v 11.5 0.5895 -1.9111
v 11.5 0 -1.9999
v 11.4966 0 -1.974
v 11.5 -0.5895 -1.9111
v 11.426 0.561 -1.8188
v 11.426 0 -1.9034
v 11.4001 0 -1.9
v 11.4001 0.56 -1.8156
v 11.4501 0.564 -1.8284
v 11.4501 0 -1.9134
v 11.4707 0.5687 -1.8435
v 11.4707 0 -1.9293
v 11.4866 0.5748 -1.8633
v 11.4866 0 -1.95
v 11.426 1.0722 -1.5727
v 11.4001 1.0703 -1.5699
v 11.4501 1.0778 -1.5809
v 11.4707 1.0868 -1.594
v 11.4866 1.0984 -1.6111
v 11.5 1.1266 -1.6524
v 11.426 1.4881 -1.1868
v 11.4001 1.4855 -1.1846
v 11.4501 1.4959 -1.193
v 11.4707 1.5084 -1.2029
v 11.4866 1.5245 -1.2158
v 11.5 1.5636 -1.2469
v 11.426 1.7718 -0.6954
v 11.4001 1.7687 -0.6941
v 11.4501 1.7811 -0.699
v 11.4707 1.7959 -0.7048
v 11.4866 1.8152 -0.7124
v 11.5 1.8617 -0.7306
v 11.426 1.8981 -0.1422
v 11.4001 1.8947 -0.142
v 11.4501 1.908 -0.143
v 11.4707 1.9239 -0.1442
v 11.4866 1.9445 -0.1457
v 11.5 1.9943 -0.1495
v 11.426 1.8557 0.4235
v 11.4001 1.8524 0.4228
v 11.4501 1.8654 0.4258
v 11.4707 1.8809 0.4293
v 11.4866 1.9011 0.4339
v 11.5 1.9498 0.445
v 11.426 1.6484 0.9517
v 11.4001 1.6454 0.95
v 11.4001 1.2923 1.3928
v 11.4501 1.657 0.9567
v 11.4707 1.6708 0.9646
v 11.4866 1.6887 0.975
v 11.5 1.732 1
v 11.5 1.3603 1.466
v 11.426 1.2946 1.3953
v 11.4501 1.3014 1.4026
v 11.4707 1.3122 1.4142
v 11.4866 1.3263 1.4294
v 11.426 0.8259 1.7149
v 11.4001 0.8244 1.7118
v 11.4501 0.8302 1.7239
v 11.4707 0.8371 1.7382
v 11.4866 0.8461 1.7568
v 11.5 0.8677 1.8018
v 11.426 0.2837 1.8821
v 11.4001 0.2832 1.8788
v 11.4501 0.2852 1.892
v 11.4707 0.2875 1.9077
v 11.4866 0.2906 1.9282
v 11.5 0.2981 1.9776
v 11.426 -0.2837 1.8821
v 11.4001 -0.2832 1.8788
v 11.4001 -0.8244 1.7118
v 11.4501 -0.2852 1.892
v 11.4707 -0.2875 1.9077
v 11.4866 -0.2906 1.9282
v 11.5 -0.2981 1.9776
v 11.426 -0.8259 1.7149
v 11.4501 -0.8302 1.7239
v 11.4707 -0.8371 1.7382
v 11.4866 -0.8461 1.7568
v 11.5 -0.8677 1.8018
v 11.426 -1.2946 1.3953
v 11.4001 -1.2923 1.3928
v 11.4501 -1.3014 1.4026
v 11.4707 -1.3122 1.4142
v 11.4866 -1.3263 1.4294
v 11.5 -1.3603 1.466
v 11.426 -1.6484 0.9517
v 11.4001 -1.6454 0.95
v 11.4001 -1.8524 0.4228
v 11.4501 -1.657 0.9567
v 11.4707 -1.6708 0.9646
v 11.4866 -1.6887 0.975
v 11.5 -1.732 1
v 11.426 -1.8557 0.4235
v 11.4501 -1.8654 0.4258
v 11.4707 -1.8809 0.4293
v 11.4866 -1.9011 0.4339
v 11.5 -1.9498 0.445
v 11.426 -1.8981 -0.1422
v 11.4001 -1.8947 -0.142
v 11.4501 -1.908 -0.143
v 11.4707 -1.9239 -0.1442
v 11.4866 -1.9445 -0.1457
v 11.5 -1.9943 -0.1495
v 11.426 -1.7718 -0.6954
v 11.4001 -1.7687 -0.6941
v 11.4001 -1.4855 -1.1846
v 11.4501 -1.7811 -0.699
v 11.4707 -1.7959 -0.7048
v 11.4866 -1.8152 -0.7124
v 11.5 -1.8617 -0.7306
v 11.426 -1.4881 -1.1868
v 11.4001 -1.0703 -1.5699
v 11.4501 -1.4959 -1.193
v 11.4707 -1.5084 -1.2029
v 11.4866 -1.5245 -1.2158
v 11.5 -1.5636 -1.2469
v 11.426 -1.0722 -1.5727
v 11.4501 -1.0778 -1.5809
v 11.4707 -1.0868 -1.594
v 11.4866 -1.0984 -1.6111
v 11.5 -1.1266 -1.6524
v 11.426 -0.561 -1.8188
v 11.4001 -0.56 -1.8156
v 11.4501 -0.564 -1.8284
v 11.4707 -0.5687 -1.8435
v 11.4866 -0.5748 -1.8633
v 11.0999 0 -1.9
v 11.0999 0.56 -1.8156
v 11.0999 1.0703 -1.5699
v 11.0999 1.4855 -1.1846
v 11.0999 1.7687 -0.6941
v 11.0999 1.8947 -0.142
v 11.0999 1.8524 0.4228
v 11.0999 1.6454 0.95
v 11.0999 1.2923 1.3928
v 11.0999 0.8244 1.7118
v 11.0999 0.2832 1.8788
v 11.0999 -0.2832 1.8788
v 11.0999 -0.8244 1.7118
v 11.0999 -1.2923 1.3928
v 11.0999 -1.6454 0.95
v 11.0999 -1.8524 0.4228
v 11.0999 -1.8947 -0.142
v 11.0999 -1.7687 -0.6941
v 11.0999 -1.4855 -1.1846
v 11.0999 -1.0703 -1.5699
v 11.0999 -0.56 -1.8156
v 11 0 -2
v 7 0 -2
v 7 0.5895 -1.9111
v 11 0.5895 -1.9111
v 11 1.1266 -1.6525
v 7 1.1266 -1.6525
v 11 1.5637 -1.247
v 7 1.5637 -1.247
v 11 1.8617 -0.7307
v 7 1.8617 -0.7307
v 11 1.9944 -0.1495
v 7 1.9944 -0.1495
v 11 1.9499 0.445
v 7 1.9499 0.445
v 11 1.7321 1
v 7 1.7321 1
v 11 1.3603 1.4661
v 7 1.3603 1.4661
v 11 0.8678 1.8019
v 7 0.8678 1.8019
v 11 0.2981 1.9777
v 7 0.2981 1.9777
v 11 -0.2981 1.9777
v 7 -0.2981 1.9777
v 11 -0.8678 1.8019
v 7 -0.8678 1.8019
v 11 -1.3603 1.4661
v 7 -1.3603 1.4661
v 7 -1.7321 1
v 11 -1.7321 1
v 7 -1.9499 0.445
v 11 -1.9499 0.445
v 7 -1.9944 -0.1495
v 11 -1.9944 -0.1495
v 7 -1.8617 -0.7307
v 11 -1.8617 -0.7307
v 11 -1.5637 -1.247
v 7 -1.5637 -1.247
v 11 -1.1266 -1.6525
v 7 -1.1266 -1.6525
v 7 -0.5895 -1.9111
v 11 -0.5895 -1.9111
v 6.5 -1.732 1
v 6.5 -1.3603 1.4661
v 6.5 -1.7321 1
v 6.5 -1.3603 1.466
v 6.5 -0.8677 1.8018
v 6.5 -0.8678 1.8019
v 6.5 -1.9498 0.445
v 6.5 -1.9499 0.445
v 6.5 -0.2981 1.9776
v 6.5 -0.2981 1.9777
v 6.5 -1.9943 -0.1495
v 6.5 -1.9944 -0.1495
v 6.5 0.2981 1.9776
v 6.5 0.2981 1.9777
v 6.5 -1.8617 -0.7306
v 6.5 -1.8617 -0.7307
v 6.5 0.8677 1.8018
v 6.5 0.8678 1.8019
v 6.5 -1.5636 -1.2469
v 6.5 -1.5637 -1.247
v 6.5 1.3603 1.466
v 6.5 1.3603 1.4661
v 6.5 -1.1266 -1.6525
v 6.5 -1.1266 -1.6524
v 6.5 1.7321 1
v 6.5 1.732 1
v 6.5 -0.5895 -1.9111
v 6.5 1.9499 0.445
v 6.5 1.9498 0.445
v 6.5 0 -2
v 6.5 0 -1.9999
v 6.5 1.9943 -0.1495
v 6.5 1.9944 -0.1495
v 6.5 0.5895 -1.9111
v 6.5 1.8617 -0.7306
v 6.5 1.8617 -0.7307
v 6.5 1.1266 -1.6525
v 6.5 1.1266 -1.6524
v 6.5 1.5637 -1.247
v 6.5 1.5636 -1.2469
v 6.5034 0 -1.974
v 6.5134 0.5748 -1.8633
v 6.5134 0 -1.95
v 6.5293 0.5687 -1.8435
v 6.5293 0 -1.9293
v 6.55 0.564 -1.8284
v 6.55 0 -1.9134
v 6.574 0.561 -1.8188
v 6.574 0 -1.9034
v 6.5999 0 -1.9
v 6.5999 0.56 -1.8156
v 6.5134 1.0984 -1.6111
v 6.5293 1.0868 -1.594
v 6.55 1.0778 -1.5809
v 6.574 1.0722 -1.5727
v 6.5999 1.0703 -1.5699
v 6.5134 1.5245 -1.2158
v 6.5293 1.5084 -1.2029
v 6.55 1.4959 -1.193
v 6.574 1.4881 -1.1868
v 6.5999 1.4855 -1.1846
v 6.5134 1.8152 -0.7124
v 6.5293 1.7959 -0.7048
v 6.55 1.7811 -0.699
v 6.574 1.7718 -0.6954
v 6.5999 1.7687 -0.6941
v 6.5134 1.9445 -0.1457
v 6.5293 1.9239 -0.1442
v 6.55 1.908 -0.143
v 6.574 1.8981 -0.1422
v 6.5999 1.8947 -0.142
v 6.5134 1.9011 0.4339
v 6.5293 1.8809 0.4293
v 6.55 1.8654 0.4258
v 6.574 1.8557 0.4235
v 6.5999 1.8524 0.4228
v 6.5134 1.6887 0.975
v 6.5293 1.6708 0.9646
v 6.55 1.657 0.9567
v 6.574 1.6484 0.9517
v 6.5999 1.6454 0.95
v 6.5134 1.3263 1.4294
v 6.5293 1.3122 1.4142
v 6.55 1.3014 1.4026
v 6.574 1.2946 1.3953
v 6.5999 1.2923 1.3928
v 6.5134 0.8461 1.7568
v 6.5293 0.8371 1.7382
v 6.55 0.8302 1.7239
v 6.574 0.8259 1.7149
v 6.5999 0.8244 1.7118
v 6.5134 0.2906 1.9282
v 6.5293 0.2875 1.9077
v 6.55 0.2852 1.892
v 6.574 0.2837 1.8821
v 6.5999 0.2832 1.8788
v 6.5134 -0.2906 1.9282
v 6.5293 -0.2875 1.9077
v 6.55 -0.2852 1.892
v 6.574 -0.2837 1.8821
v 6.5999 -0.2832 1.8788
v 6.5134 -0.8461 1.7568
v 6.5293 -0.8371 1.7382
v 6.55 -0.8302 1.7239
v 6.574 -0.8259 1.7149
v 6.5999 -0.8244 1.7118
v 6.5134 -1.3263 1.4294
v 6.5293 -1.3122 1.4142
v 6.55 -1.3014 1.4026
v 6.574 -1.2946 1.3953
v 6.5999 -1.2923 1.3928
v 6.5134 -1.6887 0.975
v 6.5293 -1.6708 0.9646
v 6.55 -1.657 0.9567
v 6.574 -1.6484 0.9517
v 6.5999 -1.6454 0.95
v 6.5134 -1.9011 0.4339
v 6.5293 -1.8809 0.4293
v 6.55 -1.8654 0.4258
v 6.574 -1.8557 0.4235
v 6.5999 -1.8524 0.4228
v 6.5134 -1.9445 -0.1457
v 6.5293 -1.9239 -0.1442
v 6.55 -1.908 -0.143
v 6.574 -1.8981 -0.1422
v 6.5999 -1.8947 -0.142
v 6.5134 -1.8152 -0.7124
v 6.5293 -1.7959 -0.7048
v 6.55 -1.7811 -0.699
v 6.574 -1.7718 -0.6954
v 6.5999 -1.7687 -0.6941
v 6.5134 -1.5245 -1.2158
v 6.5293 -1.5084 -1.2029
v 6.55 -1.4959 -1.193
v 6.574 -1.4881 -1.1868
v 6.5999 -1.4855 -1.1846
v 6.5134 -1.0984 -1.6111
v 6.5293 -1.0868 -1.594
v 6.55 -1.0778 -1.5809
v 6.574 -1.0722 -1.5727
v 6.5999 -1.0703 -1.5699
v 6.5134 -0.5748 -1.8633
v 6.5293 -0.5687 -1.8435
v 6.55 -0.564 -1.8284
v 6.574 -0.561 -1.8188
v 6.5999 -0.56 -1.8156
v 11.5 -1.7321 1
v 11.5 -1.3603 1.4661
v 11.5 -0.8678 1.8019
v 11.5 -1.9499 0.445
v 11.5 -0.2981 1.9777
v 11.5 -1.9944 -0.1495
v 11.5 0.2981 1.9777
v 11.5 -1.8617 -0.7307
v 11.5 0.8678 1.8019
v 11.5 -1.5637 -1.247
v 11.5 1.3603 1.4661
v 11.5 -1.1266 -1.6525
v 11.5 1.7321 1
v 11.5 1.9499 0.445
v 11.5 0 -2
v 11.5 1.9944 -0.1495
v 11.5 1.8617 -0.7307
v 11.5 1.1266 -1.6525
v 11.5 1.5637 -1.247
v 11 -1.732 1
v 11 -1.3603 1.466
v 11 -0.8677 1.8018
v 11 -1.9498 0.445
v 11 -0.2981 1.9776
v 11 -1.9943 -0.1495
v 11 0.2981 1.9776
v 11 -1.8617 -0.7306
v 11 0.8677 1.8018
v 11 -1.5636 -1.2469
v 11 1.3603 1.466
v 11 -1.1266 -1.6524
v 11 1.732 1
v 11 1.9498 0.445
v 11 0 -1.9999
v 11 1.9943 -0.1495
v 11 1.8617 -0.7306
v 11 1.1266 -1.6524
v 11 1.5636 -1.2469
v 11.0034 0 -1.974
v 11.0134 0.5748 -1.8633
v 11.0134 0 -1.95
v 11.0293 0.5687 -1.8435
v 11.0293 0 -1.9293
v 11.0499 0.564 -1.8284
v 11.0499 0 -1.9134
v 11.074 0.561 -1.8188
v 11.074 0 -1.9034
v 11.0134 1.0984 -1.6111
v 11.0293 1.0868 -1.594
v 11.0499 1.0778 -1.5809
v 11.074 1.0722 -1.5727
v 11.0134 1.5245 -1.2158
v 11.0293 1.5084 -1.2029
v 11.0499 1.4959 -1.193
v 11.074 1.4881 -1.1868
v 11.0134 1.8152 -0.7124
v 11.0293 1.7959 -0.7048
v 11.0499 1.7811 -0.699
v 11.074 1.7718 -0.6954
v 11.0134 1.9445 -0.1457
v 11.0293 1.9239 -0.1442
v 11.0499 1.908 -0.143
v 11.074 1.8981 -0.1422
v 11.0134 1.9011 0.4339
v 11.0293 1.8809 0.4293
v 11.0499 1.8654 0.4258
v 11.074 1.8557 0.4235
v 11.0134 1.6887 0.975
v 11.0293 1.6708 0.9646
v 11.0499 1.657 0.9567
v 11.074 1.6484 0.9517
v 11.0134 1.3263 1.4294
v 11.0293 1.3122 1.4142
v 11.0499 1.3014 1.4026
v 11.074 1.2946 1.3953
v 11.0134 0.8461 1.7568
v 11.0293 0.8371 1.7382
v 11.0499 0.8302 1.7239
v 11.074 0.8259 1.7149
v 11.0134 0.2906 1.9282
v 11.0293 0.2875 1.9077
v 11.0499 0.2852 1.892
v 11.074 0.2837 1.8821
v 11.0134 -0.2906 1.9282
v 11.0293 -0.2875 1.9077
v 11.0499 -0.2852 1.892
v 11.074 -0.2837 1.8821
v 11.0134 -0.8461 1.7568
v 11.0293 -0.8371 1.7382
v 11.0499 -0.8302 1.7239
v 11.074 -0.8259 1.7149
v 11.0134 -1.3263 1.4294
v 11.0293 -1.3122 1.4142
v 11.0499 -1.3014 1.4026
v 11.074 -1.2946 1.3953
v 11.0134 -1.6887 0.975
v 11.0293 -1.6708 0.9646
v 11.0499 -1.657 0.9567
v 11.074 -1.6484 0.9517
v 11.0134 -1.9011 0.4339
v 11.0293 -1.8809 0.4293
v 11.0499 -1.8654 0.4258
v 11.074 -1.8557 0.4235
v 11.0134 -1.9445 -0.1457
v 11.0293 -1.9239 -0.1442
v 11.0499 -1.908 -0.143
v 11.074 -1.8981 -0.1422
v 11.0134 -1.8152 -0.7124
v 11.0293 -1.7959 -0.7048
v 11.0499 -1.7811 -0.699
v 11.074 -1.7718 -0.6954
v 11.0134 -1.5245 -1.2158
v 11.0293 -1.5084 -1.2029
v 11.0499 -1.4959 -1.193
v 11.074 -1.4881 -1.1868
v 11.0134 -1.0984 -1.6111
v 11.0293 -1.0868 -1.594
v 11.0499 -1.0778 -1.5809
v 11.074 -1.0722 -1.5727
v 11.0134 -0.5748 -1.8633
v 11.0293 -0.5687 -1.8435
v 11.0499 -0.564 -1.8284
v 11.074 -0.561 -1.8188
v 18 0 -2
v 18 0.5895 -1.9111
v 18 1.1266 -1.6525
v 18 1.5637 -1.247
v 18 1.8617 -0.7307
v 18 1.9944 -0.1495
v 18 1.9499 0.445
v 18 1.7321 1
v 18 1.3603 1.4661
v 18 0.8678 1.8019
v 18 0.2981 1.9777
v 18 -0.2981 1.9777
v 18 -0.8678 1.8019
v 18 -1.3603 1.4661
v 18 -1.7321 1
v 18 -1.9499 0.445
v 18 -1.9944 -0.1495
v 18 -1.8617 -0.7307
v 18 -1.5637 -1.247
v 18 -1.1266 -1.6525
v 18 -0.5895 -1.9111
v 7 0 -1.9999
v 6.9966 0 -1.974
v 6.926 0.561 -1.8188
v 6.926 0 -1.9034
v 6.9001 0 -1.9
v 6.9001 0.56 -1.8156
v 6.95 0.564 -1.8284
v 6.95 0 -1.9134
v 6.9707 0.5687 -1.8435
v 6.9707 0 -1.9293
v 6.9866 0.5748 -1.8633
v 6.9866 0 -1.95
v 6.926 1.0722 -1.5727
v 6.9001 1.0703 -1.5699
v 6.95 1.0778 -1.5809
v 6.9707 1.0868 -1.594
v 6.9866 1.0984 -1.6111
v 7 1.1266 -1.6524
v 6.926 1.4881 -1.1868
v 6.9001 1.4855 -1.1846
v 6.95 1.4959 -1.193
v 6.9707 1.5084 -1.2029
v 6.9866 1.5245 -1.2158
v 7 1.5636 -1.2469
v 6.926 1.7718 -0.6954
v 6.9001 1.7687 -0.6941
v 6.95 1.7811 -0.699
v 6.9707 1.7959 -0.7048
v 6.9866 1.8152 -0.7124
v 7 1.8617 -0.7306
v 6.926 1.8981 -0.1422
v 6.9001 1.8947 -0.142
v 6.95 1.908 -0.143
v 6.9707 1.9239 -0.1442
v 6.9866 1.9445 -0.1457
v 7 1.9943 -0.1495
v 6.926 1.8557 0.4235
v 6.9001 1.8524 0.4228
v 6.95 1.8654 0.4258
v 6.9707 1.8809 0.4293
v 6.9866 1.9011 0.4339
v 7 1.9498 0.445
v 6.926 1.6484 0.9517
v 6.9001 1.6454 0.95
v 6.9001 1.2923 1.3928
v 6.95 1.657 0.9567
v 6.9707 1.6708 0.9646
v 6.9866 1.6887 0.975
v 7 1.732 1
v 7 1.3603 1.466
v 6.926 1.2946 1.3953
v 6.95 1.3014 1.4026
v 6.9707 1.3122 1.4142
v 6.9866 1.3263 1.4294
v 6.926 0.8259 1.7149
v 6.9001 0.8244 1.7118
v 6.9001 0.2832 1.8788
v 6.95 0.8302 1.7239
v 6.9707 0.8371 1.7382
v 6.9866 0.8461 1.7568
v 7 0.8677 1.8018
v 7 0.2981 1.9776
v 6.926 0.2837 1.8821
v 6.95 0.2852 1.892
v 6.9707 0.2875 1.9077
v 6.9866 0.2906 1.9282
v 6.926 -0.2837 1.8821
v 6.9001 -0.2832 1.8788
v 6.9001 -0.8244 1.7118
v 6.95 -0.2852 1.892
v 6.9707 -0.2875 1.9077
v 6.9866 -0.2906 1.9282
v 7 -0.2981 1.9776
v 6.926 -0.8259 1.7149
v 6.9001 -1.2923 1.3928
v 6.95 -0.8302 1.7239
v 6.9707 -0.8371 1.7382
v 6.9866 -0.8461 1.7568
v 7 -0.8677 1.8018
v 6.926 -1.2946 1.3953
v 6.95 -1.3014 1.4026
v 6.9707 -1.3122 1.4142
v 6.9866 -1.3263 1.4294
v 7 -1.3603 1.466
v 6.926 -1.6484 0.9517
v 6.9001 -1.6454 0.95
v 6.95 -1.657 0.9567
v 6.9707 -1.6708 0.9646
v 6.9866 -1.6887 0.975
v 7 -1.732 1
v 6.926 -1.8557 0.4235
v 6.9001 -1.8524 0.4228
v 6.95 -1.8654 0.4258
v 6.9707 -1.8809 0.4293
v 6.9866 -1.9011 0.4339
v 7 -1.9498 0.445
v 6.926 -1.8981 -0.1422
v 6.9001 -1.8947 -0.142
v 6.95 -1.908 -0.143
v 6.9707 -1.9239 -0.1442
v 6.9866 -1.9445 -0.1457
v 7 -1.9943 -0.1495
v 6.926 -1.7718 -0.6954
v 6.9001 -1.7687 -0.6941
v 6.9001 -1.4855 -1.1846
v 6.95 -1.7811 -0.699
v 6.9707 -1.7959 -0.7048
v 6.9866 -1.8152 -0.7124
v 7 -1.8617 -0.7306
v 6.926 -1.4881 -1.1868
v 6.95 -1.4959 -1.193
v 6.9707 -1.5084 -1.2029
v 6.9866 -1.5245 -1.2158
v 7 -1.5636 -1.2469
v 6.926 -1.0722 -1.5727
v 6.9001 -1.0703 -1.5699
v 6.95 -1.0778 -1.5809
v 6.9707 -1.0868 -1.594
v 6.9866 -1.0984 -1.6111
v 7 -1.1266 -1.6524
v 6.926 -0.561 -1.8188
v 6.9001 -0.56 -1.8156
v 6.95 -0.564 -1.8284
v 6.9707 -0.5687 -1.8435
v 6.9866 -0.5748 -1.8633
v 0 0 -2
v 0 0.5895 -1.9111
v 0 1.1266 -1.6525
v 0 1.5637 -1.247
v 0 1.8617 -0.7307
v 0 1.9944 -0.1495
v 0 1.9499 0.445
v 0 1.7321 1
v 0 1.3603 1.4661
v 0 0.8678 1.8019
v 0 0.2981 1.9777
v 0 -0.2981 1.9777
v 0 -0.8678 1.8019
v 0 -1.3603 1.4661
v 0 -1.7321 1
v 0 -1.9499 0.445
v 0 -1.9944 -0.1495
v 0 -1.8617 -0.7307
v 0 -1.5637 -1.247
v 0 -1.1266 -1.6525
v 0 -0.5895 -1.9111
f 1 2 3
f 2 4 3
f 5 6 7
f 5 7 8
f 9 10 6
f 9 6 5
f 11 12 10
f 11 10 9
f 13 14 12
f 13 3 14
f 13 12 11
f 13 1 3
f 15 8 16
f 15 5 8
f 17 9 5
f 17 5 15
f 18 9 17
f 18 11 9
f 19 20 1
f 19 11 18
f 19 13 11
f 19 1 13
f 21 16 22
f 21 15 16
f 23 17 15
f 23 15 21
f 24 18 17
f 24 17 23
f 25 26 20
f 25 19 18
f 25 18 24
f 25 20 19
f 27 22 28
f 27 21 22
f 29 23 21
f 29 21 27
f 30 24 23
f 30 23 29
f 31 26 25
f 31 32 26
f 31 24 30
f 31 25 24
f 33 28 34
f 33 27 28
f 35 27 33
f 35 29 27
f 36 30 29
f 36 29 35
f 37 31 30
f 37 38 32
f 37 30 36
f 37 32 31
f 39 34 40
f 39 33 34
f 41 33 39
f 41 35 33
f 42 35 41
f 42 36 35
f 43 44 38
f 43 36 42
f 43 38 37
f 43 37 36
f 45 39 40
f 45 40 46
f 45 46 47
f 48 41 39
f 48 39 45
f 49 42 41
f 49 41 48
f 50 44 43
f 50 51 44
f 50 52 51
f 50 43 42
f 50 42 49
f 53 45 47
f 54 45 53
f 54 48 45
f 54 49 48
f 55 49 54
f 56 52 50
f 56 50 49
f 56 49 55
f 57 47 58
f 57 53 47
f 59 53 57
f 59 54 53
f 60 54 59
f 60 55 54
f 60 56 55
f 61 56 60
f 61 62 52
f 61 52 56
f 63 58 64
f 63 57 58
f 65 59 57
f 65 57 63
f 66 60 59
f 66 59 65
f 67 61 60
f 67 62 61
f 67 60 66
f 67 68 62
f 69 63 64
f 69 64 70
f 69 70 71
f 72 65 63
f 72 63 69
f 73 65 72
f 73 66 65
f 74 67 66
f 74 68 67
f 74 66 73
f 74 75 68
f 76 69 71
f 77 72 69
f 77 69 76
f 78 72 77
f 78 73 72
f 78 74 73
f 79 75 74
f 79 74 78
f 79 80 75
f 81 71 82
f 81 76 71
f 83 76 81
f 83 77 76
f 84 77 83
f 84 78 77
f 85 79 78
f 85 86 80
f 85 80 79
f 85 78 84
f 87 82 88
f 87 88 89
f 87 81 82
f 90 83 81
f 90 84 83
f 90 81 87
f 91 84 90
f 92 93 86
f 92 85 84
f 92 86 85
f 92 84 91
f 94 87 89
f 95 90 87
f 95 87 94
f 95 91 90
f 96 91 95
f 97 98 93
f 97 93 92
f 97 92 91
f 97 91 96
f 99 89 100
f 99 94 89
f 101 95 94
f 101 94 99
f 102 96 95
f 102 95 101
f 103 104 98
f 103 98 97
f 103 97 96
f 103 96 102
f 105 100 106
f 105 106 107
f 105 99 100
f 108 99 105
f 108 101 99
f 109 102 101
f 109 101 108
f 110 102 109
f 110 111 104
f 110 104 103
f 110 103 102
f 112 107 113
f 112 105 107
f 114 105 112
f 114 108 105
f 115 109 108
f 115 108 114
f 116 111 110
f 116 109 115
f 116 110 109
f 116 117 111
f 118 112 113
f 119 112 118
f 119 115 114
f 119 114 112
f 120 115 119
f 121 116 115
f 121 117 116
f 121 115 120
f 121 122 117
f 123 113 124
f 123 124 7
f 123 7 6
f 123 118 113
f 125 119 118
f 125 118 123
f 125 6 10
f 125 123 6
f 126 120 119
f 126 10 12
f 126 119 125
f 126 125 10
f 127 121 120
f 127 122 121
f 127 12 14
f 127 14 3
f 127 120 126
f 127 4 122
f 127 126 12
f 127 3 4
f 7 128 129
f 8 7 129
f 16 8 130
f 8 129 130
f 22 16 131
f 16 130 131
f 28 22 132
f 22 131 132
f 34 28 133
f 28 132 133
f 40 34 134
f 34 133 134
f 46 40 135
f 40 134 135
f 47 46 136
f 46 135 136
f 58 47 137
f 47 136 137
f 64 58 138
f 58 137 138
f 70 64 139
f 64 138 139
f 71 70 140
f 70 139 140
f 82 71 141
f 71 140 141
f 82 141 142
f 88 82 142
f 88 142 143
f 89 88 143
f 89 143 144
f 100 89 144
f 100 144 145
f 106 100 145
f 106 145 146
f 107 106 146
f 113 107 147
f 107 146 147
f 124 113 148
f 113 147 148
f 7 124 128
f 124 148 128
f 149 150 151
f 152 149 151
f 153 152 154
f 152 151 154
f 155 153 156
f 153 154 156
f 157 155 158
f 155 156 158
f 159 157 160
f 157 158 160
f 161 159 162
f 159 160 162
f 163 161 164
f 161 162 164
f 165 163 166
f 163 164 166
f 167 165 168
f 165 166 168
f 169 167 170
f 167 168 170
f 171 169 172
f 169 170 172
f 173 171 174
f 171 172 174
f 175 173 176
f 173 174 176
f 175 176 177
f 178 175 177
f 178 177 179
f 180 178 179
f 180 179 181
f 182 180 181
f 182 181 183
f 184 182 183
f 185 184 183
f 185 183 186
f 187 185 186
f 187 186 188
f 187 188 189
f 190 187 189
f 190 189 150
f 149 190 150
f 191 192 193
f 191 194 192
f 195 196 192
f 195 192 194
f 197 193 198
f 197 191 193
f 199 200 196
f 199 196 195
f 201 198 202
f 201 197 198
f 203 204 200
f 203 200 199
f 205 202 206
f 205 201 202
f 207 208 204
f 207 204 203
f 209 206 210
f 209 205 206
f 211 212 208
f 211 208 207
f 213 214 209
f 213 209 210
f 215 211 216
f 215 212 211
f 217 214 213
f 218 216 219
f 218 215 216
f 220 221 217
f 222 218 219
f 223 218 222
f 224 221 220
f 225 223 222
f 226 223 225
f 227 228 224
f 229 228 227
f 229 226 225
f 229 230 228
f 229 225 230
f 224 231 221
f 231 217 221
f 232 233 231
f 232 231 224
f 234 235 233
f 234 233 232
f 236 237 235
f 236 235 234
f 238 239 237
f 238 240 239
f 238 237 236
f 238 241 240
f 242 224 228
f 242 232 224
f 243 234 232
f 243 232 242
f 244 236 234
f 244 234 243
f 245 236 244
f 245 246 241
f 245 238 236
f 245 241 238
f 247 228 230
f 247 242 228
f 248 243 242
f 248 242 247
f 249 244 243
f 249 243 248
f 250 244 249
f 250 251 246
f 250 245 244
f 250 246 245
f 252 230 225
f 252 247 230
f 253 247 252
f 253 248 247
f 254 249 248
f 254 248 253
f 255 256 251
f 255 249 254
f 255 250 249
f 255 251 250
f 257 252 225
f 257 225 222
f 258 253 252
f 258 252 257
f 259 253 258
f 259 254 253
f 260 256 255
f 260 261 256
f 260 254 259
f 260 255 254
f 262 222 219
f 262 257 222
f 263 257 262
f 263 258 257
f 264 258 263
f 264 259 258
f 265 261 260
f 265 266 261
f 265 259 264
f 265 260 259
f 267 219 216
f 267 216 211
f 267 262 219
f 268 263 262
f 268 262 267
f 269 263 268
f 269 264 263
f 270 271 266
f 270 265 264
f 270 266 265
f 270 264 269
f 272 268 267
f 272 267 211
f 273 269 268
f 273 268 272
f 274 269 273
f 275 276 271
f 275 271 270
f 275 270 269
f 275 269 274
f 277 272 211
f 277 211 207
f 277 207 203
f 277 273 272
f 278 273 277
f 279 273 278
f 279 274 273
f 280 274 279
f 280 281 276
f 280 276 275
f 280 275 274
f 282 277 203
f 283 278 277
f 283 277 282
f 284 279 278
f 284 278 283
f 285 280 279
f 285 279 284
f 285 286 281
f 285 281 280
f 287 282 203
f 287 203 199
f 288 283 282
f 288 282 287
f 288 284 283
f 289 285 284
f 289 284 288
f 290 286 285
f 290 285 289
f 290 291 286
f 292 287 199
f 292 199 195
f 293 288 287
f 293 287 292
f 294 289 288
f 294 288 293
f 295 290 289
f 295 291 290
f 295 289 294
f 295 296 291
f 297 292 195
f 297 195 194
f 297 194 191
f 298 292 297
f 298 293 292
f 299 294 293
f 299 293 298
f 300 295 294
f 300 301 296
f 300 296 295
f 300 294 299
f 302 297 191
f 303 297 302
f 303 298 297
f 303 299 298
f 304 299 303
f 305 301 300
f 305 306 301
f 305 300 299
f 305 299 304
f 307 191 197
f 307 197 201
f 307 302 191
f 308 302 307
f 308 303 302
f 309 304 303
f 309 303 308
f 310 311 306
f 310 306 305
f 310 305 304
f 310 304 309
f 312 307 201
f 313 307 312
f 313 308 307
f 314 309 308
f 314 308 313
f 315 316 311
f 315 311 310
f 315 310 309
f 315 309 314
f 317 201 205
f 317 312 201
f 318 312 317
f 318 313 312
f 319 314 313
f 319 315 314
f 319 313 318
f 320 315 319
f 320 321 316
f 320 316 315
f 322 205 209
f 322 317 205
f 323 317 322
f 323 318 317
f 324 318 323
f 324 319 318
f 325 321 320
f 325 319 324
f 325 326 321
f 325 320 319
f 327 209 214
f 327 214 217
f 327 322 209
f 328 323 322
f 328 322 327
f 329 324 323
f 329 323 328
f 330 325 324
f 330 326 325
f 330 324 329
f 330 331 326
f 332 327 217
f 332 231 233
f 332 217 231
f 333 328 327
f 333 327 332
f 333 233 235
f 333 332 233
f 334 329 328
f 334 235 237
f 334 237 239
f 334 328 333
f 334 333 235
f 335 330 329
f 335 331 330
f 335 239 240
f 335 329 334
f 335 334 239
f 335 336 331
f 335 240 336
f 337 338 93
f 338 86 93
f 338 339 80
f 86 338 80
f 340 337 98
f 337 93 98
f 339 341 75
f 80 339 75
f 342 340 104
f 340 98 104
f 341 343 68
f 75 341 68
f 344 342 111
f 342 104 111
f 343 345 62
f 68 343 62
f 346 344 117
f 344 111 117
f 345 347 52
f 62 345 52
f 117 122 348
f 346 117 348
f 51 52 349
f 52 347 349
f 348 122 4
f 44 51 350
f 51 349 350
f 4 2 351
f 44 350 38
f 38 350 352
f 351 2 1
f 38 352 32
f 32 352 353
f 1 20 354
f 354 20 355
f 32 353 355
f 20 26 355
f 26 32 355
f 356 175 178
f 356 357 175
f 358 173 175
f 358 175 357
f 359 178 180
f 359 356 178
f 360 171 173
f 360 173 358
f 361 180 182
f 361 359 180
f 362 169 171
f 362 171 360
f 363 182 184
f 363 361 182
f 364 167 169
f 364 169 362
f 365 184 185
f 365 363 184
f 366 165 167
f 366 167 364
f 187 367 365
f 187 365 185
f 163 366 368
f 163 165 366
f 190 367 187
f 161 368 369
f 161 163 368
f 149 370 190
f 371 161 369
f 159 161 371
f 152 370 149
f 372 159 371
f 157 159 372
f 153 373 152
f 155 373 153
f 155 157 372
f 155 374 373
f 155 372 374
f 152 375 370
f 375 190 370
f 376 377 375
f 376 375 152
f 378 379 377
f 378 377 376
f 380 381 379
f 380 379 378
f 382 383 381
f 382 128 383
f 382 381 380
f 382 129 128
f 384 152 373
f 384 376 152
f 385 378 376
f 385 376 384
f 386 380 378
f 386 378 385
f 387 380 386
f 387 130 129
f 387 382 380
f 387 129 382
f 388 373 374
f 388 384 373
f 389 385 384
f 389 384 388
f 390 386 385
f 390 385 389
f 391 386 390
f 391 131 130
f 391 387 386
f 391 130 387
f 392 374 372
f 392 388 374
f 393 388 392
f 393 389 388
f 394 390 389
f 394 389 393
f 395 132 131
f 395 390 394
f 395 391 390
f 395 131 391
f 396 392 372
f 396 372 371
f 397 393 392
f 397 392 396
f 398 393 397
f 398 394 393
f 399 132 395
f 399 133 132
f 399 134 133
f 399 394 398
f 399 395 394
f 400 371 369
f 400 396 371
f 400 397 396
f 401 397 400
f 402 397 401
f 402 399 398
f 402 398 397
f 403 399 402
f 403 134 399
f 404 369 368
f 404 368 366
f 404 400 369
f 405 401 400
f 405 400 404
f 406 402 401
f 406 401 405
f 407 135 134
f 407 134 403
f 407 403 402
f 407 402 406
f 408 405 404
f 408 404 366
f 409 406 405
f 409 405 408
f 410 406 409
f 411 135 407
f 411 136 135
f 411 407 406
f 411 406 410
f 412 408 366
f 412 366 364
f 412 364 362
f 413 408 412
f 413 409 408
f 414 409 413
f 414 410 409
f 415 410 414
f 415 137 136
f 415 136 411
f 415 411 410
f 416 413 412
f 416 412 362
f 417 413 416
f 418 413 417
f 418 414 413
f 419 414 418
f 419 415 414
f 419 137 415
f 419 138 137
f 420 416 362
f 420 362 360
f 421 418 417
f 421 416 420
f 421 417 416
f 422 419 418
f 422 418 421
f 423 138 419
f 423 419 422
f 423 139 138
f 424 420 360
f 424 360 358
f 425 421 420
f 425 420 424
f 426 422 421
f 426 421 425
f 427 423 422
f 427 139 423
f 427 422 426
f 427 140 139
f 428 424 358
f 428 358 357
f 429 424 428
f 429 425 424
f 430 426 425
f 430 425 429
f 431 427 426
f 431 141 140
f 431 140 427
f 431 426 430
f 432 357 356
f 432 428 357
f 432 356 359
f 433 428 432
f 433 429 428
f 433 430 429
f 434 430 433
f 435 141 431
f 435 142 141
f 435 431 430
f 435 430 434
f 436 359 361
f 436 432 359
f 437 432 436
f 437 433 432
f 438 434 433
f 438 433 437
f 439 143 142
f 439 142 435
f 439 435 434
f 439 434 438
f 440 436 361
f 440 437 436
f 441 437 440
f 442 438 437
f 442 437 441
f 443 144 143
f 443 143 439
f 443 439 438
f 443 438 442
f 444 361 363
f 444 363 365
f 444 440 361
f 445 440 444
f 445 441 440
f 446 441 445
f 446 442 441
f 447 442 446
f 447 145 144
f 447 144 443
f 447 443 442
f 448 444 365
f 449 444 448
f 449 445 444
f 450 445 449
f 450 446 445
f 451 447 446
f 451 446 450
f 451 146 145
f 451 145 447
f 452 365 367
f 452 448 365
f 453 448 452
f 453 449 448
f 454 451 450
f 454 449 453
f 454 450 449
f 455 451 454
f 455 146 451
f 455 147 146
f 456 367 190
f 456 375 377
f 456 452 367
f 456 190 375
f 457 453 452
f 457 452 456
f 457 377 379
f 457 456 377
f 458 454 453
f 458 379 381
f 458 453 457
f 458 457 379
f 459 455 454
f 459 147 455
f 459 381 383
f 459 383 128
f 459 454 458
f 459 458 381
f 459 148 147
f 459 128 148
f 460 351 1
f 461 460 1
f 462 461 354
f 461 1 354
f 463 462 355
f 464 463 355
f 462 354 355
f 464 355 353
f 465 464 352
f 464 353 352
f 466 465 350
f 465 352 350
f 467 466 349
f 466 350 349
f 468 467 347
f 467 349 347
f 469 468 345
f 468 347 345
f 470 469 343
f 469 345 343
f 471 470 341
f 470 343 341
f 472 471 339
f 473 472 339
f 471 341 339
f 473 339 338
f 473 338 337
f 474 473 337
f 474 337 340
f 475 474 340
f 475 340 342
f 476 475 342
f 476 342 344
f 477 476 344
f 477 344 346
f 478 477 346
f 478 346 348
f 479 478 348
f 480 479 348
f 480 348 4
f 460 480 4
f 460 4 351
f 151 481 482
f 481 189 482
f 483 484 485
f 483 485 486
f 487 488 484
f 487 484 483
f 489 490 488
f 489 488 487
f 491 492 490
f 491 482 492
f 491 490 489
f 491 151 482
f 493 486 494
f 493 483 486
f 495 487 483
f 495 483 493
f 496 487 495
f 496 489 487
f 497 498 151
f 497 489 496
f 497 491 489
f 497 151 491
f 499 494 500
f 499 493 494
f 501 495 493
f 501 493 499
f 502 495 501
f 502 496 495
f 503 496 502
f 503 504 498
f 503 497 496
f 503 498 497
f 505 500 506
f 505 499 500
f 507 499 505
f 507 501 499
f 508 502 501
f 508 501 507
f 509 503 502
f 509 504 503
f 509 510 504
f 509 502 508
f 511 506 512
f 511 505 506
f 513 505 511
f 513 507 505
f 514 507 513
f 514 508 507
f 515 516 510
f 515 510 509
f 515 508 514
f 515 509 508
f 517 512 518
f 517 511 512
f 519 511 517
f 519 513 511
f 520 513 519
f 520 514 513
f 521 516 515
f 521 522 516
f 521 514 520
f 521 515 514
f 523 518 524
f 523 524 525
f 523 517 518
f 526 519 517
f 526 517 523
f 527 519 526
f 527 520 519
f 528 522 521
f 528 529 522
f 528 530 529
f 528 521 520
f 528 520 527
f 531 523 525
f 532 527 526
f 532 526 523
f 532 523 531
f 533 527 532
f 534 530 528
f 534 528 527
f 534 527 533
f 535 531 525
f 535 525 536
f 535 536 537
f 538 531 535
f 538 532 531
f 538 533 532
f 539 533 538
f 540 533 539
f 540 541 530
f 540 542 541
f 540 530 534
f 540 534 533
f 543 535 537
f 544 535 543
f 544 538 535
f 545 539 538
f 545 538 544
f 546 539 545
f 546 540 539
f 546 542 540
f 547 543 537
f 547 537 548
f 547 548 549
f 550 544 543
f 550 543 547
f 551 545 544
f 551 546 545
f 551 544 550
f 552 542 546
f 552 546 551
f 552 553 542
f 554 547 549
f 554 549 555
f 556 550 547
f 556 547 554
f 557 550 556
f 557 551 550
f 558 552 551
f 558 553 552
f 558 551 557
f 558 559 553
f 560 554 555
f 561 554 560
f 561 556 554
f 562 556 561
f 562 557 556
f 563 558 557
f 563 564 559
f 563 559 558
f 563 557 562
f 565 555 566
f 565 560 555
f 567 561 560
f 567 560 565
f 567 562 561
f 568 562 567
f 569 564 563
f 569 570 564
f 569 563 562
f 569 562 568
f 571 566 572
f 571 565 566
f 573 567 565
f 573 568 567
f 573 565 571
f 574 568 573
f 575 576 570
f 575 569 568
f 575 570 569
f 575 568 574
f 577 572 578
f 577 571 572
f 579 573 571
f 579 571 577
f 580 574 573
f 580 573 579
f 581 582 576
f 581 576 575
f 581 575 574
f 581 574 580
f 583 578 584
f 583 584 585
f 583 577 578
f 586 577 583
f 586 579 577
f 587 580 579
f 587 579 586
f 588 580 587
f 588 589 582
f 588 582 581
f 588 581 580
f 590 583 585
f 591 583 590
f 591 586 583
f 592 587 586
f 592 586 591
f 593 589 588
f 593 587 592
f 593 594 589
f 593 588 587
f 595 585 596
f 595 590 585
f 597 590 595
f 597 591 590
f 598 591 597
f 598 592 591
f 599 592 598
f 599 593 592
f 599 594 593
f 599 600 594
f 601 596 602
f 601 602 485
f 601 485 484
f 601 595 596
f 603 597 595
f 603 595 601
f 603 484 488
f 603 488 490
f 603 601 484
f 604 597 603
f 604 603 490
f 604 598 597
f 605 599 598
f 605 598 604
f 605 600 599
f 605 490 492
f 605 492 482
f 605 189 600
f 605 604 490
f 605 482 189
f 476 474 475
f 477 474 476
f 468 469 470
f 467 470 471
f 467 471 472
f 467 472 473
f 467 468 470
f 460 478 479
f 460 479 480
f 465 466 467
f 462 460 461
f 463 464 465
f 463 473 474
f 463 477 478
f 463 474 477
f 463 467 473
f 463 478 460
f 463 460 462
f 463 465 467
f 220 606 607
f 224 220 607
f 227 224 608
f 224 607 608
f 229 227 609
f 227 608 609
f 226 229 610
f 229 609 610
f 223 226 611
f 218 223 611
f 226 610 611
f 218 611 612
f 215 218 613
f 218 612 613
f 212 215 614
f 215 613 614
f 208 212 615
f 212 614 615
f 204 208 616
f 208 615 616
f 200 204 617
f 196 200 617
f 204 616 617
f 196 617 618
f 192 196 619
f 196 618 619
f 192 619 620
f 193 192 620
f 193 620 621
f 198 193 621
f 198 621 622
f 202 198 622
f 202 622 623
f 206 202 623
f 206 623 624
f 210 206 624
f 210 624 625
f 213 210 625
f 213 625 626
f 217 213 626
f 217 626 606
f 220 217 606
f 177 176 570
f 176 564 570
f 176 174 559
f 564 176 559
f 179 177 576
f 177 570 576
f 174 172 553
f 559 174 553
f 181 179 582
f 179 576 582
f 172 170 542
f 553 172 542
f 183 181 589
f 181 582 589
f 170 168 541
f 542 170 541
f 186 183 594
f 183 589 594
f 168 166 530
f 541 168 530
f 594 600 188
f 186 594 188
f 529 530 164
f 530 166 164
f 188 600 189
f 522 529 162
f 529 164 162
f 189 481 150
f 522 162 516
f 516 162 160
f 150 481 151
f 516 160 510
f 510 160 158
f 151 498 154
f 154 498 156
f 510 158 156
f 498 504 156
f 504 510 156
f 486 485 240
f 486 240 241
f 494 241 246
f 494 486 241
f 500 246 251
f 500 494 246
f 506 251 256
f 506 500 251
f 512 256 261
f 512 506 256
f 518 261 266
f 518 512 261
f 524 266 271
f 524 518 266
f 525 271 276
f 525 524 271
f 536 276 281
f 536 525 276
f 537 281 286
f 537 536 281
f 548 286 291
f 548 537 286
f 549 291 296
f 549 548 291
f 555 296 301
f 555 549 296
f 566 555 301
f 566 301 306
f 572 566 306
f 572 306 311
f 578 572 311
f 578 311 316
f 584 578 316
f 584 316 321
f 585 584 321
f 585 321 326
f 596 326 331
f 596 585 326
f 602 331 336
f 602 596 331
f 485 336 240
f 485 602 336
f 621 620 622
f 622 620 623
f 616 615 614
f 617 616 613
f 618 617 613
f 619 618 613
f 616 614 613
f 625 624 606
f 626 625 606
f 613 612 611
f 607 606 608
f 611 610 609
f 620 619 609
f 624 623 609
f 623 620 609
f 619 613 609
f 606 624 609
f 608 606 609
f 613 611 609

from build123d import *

# Parameters (mm, degrees)
SKETCH_1_R          = 2
EXTRUDE_1_DEPTH     = 18
CUT_EXTRUDE_START   = -7
SKETCH_2_R          = 2
SKETCH_2_R_2        = 1.9
CUT_EXTRUDE_1_DEPTH = 0.5
FILLET_1_R          = 0.1


with BuildPart() as part:
    # 草图1 → 凸台-拉伸1 (new body)
    with BuildSketch(Plane(origin=(0, 0, 0), x_dir=(0, 0, -1), z_dir=(1, 0, 0))):
        Circle(SKETCH_1_R)
    extrude(amount=EXTRUDE_1_DEPTH)

    # 草图2 → 切除-拉伸1 (cut)
    with BuildSketch(Plane(origin=(18, 0, 0), x_dir=(0, 0, -1), z_dir=(1, 0, 0)).offset(CUT_EXTRUDE_START)):
        Circle(SKETCH_2_R)
        Circle(SKETCH_2_R_2, mode=Mode.SUBTRACT)
    cut_extrude_1 = extrude(amount=CUT_EXTRUDE_1_DEPTH, mode=Mode.SUBTRACT)

    # 镜向1: 切除-拉伸1 across plane
    add(cut_extrude_1.mirror(Plane(origin=(9, 0, 0), x_dir=(0, 0, 1), z_dir=(1, 0, 0))), mode=Mode.SUBTRACT)

    # 圆角1
    fillet_1_edges = [part.edges().sort_by_distance(p)[0] for p in [
        (6.5, 0, 1.9),
        (7, 0, 1.9),
        (11, 0, 1.9),
        (11.5, 0, 1.9),
    ]]
    fillet(fillet_1_edges, radius=FILLET_1_R - 0.0001)  # a hair under: the kernel refuses the full size


solid = part.part
